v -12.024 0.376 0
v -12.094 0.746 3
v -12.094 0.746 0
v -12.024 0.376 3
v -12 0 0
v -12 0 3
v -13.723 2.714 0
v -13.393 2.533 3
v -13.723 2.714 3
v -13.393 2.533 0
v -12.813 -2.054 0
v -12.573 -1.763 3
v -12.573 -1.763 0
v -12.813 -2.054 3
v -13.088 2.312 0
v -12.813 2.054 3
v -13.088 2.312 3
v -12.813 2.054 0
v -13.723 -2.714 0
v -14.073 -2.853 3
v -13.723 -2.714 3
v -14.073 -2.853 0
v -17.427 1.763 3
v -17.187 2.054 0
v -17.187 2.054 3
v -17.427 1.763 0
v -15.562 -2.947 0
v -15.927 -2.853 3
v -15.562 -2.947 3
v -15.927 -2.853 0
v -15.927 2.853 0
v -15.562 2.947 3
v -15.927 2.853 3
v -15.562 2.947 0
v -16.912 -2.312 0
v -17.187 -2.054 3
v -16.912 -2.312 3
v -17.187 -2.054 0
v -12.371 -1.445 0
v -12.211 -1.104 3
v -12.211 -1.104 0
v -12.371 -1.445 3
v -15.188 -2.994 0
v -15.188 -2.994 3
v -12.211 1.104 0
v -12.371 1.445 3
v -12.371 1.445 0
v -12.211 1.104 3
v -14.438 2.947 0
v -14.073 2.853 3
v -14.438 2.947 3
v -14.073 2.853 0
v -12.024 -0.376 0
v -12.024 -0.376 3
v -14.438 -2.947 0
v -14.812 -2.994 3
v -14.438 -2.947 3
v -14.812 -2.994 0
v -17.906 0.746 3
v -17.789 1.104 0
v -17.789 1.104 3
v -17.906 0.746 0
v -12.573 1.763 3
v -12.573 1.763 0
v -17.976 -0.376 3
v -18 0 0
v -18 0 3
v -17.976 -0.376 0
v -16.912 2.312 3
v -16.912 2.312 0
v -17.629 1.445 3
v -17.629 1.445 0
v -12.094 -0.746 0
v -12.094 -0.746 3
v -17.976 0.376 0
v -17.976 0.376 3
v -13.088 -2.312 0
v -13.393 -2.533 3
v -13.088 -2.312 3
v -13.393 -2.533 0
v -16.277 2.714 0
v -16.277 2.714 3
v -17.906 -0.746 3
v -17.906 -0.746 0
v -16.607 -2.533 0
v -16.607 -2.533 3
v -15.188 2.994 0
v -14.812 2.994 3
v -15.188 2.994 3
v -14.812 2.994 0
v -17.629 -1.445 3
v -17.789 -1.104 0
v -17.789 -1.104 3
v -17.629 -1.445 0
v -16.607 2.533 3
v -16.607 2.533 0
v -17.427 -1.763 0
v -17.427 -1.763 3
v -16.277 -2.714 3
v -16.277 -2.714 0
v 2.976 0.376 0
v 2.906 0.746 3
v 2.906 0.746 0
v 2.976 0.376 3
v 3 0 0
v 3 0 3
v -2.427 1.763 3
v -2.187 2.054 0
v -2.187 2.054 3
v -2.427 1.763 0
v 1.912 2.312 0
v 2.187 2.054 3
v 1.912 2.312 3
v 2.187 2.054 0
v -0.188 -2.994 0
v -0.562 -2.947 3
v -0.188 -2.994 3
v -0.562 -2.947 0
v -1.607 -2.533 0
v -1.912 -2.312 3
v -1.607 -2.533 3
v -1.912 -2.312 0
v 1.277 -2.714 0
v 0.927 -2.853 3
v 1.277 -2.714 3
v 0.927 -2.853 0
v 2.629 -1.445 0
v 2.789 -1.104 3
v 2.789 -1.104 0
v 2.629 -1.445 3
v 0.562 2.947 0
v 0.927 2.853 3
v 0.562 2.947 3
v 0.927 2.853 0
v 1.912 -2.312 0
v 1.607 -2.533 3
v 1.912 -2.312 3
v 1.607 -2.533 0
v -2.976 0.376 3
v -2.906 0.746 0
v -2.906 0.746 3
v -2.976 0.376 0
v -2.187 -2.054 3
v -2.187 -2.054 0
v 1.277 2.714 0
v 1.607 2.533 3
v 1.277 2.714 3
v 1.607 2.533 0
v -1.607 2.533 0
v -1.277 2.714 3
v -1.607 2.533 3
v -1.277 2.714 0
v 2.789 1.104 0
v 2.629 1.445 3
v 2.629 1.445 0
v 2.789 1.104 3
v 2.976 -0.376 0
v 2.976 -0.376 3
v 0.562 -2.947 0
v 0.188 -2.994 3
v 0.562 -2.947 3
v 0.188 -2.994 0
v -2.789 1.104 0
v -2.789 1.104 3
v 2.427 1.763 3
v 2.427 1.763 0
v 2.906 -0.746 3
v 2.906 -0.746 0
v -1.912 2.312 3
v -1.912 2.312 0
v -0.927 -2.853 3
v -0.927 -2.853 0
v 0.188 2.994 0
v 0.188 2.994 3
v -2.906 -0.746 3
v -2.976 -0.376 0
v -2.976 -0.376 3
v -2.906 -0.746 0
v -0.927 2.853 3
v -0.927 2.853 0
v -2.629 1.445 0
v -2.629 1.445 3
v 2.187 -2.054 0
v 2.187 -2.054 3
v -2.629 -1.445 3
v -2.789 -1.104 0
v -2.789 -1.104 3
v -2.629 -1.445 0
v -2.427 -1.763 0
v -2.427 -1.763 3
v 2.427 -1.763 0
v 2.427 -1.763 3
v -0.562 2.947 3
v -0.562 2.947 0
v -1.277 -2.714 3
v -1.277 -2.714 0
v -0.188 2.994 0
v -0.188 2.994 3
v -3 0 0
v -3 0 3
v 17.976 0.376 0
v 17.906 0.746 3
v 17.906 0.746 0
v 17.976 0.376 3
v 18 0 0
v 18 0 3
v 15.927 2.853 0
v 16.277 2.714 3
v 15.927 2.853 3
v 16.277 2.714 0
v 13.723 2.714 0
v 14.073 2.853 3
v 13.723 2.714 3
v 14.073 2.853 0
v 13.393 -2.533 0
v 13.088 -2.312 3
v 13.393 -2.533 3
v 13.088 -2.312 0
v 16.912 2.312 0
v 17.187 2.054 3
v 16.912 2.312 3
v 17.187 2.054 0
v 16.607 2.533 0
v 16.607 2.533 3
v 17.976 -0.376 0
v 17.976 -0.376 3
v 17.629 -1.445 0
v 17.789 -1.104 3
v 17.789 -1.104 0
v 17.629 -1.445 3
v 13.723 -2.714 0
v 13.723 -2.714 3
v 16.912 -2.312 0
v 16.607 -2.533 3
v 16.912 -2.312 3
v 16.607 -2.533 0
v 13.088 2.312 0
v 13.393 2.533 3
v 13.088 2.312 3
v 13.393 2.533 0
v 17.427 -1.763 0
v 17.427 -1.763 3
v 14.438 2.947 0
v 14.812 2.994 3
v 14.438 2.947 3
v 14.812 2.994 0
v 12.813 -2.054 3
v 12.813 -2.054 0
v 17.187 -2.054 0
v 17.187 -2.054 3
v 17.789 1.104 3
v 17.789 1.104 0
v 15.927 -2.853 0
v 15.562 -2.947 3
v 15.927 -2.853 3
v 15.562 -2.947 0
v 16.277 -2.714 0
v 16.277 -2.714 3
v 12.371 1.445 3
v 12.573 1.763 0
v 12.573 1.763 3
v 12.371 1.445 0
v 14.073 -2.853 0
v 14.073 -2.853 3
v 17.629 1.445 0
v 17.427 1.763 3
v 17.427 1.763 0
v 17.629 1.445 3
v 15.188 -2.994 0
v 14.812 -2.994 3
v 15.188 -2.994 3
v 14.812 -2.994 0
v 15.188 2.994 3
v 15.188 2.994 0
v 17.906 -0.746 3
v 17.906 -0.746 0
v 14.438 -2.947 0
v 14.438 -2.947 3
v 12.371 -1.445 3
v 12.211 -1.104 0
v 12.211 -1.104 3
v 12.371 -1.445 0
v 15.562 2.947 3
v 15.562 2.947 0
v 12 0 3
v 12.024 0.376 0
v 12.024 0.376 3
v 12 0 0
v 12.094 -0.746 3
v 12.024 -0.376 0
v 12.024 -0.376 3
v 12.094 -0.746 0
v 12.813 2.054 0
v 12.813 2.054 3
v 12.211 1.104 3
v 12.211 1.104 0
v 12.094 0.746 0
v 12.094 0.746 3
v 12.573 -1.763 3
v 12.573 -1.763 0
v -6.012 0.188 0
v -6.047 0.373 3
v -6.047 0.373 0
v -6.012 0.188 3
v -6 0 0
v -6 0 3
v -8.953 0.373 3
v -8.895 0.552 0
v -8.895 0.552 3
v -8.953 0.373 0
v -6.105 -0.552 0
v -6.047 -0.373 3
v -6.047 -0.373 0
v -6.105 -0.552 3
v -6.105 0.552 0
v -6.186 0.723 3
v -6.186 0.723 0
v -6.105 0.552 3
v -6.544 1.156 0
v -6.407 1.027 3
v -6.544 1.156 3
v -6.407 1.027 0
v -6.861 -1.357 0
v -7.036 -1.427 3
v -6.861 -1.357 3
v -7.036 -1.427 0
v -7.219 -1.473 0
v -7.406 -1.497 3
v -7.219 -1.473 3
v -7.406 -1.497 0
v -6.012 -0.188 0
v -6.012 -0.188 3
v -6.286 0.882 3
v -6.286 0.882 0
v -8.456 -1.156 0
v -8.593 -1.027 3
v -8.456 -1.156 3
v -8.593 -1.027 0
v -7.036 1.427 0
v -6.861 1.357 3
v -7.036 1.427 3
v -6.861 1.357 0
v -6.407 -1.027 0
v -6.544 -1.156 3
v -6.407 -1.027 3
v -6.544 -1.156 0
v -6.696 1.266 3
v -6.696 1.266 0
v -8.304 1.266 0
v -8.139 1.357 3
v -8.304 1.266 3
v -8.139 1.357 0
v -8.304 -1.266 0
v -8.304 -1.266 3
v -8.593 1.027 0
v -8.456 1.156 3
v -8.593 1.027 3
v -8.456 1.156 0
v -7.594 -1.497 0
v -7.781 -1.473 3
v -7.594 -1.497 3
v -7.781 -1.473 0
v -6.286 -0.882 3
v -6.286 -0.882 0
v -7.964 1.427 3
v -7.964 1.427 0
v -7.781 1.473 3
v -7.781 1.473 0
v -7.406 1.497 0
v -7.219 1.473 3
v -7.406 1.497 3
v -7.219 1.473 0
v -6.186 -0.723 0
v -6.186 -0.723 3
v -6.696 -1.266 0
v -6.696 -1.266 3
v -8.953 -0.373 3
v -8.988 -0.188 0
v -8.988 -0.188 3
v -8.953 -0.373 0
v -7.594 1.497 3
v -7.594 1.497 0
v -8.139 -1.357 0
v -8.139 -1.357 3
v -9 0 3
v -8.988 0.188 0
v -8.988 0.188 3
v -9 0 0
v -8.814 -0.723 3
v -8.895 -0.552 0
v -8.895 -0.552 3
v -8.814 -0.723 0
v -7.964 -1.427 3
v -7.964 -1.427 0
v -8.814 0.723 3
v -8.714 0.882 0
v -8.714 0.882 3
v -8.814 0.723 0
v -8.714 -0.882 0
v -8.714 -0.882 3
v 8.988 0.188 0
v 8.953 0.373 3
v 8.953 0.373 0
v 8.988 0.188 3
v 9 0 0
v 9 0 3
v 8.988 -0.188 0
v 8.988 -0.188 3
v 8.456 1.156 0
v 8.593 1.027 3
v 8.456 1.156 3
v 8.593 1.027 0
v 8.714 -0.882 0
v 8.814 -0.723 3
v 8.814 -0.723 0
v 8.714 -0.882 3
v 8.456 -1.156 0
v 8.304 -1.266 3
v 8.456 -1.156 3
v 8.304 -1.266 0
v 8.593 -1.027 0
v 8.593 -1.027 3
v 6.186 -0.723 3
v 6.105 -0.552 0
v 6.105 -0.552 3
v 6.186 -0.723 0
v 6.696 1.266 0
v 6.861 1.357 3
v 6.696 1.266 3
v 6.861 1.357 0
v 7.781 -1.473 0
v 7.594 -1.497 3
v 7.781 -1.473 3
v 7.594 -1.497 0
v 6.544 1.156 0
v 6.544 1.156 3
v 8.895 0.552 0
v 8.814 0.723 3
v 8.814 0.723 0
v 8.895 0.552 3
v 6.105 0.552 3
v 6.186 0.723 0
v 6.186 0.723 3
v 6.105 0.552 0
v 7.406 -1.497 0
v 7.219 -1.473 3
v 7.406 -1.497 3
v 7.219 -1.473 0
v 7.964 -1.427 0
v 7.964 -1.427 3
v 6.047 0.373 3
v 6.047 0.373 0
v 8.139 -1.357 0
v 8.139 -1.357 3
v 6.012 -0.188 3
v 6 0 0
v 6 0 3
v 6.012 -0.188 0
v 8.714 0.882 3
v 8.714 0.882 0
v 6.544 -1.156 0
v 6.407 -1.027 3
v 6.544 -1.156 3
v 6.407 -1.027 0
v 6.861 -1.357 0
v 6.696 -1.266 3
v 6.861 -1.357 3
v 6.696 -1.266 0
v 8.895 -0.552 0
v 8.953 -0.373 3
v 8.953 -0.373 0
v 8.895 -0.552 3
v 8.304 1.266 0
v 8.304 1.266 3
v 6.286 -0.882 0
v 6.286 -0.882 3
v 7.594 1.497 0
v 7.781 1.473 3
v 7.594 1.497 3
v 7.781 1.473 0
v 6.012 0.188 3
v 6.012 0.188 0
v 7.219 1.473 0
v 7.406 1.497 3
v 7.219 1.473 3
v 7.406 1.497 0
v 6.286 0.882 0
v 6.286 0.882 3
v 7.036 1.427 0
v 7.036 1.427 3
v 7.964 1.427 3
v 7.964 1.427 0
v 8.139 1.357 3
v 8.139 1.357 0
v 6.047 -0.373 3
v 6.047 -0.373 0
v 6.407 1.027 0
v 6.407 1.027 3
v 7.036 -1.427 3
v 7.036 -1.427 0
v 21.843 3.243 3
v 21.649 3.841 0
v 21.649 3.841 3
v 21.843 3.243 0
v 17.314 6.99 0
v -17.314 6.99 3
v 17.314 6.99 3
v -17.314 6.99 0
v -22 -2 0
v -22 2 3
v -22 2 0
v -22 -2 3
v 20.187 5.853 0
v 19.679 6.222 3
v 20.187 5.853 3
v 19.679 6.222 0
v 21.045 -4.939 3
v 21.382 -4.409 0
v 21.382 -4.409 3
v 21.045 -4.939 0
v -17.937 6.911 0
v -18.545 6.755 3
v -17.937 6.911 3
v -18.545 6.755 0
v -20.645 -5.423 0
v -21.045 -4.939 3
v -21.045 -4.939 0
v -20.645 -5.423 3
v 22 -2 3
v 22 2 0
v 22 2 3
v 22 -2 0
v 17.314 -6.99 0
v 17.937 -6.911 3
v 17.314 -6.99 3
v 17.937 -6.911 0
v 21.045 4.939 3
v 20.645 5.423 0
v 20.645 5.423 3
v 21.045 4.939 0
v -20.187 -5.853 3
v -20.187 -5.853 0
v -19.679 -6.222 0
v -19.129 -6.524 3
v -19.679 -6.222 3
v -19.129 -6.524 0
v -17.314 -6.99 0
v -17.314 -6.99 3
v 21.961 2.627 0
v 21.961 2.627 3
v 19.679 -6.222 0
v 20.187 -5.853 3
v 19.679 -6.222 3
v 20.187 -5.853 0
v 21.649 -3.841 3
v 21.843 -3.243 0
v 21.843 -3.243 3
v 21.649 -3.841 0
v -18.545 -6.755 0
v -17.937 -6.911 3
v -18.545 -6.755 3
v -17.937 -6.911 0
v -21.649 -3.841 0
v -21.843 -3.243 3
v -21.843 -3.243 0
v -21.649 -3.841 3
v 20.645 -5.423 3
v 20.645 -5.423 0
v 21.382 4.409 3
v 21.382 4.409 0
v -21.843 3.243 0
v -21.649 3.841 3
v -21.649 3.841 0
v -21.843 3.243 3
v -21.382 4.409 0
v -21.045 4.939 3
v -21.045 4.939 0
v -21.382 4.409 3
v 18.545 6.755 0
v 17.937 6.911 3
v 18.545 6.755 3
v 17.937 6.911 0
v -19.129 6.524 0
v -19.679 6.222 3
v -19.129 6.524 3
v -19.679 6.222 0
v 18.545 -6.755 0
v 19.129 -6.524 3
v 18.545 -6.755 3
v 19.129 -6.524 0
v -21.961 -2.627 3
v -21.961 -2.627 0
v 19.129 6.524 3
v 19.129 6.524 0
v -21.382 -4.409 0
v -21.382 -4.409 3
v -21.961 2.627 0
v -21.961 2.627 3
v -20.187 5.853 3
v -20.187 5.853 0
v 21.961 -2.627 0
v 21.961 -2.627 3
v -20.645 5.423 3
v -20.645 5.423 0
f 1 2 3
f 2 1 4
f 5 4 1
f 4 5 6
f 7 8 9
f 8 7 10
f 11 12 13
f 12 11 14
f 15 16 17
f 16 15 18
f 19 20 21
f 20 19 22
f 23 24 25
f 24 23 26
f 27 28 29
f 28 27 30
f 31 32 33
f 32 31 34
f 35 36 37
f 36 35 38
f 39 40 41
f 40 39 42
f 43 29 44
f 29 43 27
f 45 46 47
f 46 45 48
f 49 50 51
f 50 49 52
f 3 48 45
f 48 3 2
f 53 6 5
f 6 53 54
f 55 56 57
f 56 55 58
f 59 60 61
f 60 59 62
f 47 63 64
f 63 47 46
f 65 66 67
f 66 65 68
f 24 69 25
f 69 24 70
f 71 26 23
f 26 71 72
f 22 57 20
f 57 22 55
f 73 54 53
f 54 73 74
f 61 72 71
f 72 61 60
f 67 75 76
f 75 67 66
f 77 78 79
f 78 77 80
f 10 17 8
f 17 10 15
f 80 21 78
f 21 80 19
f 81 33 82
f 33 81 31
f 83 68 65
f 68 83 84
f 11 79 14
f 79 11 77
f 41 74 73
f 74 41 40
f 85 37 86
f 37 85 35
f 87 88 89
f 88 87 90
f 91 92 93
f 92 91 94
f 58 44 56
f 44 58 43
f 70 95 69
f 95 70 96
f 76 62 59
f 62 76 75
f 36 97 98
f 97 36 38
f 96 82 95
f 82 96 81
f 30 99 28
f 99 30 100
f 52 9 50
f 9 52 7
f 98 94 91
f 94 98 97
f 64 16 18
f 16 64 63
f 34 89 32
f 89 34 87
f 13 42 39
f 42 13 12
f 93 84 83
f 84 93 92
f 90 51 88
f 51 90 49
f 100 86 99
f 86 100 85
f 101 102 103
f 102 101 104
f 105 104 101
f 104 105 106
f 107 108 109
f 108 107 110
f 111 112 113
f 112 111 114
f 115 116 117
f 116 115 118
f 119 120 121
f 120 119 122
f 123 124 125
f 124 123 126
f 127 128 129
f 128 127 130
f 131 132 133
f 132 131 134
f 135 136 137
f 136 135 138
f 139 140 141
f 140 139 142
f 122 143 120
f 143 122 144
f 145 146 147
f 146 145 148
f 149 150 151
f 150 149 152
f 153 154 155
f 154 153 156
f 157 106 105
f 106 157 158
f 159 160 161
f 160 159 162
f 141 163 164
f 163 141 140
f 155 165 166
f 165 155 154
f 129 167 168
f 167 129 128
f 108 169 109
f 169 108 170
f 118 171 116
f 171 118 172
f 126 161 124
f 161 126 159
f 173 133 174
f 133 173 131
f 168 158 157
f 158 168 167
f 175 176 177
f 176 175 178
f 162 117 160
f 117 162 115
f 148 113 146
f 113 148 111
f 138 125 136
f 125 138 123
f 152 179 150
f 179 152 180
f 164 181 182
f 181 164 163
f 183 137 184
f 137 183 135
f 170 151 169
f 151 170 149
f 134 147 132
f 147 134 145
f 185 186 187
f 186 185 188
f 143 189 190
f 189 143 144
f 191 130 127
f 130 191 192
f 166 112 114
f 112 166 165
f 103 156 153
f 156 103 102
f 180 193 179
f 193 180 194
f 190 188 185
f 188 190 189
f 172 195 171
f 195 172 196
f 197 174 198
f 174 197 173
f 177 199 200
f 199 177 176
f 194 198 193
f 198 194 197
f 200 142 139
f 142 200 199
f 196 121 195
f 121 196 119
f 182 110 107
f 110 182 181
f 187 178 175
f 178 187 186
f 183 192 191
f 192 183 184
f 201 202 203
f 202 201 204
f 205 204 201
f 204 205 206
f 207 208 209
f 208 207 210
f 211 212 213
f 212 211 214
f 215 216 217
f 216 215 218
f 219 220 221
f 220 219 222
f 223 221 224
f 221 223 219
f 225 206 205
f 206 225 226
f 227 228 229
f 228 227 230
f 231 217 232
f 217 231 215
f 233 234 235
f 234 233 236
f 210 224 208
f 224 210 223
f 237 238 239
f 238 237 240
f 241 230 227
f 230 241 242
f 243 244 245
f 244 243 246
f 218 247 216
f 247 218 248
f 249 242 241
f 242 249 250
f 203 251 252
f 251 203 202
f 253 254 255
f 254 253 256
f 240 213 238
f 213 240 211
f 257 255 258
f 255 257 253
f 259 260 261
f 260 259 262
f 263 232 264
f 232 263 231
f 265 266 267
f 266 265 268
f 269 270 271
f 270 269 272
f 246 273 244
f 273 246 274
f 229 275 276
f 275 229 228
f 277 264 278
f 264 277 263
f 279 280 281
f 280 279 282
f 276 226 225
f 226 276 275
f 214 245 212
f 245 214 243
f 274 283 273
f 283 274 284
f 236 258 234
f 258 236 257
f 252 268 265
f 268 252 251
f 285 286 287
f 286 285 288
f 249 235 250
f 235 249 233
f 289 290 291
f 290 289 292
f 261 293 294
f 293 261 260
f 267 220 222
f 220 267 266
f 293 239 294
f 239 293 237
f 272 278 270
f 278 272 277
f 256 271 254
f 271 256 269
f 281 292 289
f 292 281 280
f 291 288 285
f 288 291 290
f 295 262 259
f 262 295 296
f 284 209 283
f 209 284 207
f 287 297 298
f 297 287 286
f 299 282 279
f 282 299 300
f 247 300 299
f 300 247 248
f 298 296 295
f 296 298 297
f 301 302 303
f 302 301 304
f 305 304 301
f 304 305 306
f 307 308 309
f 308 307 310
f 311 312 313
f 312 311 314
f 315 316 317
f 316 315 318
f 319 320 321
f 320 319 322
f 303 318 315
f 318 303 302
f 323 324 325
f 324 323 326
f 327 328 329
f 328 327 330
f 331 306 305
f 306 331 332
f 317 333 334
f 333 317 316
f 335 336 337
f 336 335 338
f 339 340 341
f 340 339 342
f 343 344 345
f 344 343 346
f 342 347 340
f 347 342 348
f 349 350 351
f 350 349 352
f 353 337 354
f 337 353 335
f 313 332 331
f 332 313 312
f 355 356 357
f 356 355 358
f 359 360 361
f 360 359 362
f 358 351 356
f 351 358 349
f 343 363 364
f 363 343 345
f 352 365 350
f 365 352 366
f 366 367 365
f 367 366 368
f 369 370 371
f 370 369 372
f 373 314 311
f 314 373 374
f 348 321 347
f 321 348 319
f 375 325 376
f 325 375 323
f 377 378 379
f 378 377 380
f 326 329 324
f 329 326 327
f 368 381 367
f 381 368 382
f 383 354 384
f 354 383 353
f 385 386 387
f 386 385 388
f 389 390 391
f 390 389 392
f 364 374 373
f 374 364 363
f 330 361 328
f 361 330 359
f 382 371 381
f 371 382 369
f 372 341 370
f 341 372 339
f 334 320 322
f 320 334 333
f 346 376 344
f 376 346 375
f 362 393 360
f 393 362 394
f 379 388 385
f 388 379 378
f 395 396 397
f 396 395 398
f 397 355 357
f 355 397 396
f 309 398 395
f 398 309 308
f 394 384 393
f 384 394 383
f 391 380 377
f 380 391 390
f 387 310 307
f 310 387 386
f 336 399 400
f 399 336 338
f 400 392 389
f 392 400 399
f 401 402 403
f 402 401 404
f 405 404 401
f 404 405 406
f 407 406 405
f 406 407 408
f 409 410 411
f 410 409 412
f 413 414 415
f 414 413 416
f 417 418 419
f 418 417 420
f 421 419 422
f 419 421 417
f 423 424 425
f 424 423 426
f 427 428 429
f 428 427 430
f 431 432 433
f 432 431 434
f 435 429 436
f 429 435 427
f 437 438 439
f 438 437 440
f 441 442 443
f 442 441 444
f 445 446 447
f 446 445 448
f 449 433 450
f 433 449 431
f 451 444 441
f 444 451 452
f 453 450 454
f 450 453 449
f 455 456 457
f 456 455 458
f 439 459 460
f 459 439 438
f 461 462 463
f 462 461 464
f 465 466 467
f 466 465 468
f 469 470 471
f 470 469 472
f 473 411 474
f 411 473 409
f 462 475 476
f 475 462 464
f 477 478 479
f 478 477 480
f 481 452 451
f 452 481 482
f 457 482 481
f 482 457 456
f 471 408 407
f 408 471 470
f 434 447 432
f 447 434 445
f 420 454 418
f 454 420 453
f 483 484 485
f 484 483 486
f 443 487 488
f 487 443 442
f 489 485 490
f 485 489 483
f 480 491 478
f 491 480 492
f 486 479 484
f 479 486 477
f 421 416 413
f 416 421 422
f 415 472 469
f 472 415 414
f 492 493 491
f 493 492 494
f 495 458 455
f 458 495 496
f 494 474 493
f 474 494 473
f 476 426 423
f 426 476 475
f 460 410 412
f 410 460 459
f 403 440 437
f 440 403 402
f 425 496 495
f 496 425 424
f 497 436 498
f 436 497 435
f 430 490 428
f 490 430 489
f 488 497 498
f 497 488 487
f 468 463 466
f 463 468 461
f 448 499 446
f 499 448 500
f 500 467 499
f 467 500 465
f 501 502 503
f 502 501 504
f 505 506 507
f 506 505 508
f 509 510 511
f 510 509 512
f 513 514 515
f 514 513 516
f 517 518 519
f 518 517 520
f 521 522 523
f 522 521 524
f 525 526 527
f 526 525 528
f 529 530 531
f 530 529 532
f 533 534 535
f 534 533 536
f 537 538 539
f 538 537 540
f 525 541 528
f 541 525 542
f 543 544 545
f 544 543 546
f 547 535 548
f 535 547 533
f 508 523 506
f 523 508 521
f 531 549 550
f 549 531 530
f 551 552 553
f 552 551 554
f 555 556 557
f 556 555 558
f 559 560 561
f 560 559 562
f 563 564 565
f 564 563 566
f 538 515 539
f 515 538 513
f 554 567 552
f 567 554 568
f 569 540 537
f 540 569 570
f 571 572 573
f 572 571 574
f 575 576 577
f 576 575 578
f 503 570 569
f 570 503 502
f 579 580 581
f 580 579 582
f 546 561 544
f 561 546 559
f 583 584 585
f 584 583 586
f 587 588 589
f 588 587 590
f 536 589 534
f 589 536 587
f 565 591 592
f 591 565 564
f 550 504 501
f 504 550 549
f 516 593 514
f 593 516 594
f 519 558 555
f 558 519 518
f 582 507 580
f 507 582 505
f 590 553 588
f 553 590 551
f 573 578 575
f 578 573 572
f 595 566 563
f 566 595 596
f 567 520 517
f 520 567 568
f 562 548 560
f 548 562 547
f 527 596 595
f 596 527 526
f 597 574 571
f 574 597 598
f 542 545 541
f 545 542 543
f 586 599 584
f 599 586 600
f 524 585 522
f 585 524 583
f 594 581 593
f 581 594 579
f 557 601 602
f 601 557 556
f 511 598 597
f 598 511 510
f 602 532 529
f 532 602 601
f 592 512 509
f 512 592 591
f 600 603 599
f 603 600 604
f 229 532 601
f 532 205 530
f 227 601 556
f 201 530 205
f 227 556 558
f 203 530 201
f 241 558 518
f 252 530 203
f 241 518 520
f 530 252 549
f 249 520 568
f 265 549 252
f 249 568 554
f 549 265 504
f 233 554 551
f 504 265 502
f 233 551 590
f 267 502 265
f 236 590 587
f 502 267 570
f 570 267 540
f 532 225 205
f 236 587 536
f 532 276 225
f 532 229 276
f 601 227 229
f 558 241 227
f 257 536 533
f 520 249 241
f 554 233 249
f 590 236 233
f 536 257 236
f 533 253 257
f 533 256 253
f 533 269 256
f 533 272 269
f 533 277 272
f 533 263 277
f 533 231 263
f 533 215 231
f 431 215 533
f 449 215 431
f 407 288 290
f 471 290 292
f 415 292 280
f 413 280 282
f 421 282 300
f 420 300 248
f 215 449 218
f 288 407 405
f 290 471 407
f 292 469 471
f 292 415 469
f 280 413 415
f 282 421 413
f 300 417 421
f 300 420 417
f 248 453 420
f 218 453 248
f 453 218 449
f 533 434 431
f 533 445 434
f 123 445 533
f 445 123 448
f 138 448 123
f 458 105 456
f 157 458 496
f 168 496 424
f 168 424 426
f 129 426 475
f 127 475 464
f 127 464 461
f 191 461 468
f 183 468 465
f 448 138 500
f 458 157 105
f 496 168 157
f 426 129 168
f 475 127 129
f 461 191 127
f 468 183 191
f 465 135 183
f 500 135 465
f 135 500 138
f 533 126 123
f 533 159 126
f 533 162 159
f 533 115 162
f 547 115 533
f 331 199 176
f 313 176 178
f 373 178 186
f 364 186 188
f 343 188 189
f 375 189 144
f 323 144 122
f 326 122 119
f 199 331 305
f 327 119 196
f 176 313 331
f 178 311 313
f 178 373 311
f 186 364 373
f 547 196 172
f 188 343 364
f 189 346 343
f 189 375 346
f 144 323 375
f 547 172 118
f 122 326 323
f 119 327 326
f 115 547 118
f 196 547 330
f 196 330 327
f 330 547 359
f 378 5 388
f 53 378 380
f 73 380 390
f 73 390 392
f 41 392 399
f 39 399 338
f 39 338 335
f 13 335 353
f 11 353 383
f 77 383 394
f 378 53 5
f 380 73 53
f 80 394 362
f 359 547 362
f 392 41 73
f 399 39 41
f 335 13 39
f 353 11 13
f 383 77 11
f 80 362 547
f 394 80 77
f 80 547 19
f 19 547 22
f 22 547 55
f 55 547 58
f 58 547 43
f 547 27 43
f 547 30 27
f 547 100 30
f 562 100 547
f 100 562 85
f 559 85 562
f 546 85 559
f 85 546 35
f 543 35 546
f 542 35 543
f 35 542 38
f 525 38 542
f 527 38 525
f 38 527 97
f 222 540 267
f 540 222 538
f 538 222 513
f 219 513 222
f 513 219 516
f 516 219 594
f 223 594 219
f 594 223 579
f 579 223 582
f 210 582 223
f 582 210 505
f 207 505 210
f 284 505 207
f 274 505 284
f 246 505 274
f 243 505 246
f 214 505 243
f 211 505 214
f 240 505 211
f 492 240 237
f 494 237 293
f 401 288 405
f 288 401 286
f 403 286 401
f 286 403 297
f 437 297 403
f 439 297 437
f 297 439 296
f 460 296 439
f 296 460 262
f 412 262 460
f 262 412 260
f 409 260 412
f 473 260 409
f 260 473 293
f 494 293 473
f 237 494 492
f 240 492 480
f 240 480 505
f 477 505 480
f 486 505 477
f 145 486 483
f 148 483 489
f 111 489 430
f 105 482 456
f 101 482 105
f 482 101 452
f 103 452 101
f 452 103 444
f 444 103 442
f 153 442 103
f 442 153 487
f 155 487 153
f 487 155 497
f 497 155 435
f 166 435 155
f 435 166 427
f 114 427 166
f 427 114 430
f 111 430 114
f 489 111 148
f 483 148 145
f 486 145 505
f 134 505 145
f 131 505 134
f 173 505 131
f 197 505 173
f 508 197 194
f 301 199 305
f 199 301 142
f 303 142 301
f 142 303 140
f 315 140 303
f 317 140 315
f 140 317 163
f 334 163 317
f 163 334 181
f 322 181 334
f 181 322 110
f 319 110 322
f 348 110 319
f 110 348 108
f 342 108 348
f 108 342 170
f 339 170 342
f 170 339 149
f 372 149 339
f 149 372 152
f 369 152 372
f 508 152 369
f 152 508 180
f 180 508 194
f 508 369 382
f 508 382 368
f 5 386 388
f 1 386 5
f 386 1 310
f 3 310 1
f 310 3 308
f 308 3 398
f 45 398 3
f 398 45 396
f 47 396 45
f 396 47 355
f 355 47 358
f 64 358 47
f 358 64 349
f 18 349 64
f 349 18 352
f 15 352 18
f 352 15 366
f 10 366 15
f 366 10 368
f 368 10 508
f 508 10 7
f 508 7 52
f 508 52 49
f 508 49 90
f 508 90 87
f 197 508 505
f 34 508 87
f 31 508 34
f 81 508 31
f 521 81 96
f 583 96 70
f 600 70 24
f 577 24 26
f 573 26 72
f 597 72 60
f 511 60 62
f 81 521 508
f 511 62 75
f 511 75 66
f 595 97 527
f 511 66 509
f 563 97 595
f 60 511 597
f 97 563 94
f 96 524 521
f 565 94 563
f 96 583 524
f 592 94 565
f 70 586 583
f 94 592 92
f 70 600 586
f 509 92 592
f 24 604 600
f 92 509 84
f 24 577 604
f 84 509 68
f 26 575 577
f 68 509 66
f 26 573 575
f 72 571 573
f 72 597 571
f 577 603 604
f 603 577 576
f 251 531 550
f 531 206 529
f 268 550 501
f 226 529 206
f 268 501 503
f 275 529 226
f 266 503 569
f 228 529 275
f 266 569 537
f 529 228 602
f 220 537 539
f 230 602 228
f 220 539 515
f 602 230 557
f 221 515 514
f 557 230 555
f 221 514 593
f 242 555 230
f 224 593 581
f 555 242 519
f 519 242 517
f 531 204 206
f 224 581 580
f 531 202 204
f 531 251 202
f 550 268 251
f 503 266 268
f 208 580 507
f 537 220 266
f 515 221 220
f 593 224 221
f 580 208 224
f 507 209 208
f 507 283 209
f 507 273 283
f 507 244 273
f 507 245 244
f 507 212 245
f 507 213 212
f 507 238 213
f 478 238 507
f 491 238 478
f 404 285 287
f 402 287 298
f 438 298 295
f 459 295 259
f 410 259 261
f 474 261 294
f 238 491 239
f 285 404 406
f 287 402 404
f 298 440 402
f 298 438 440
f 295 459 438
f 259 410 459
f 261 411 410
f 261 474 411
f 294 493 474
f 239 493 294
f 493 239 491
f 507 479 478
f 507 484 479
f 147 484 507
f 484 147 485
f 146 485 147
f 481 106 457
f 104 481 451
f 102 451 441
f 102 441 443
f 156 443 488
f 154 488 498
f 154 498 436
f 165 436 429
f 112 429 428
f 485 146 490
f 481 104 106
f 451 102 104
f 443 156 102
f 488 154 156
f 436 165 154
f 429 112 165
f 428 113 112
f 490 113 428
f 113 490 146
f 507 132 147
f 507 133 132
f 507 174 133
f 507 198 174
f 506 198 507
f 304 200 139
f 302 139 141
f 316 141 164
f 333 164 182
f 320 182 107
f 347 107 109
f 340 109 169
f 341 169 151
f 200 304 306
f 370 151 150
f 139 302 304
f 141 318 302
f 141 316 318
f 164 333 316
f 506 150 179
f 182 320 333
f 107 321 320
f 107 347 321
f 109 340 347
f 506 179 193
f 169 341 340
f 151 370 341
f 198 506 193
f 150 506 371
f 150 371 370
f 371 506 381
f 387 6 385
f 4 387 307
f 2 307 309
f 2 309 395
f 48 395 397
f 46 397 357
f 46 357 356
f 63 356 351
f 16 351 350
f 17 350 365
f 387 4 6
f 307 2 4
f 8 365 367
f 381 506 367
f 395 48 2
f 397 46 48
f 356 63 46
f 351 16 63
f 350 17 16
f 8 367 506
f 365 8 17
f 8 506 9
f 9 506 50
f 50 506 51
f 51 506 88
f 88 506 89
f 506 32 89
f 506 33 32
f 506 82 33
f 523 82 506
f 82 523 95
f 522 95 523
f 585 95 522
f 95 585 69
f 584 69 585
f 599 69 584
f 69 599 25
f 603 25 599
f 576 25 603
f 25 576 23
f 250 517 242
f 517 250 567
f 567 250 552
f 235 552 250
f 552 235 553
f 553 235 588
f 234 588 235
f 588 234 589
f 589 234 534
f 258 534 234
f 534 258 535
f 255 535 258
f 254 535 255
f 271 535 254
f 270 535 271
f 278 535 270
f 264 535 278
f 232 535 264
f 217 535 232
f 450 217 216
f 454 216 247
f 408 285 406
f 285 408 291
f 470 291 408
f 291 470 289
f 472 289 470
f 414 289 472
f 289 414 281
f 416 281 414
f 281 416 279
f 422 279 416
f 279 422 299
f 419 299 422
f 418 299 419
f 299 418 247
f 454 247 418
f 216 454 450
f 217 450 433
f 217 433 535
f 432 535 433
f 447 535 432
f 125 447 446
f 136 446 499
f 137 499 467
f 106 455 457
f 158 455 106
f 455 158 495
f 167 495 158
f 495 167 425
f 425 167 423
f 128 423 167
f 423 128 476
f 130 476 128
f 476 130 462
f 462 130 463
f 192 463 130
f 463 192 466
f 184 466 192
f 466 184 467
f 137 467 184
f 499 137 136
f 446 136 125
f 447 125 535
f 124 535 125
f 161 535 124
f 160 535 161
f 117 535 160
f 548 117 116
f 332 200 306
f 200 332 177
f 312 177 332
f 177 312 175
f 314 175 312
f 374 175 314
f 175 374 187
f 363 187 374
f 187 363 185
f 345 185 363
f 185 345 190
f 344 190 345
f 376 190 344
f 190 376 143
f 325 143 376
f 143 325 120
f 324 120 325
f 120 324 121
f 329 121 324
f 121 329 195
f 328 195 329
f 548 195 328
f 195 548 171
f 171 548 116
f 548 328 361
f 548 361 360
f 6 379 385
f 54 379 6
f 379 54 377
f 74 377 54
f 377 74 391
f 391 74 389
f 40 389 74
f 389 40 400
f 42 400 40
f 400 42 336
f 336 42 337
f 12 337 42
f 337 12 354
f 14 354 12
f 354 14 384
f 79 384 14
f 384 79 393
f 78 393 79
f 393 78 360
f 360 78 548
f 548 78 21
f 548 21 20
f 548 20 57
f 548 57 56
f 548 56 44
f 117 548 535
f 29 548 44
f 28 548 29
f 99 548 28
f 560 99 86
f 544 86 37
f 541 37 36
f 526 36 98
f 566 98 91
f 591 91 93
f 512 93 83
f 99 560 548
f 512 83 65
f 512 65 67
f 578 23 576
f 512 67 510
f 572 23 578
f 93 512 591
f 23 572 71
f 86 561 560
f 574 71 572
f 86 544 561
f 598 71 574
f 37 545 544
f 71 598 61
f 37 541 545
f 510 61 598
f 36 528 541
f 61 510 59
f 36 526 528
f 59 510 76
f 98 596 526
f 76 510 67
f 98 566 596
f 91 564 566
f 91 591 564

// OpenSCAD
$fn = 50;


difference() {
	union() {
		*color(alpha = 1.0000000000, c = "gray") {
			translate(v = [0, 7, 0]) {
				linear_extrude(height = 1) {
					text(font = "Arial:style=Bold", halign = "center", size = 4.5000000000, text = "COMMENT plate main", valign = "center");
				}
			}
		}
		hull() {
			translate(v = [-17.0000000000, 2.0000000000, 0]) {
				cylinder(h = 3, r = 5);
			}
			translate(v = [17.0000000000, 2.0000000000, 0]) {
				cylinder(h = 3, r = 5);
			}
			translate(v = [-17.0000000000, -2.0000000000, 0]) {
				cylinder(h = 3, r = 5);
			}
			translate(v = [17.0000000000, -2.0000000000, 0]) {
				cylinder(h = 3, r = 5);
			}
		}
	}
	union() {
		*color(alpha = 1.0000000000, c = "gray") {
			translate(v = [0, 7, 0]) {
				linear_extrude(height = 1) {
					text(font = "Arial:style=Bold", halign = "center", size = 4.5000000000, text = "COMMENT holes main", valign = "center");
				}
			}
		}
		translate(v = [-15.0000000000, 0.0000000000, 0]) {
			translate(v = [0, 0, -100]) {
				cylinder(h = 200, r = 3.0000000000);
			}
		}
		translate(v = [0, 0, -100]) {
			cylinder(h = 200, r = 3.0000000000);
		}
		translate(v = [15.0000000000, 0.0000000000, 0]) {
			translate(v = [0, 0, -100]) {
				cylinder(h = 200, r = 3.0000000000);
			}
		}
		translate(v = [-15.0000000000, 0.0000000000, 0]) {
			translate(v = [0, 0, -100]) {
				cylinder(h = 200, r = 1.5000000000);
			}
		}
		translate(v = [-7.5000000000, 0.0000000000, 0]) {
			translate(v = [0, 0, -100]) {
				cylinder(h = 200, r = 1.5000000000);
			}
		}
		translate(v = [0, 0, -100]) {
			cylinder(h = 200, r = 1.5000000000);
		}
		translate(v = [7.5000000000, 0.0000000000, 0]) {
			translate(v = [0, 0, -100]) {
				cylinder(h = 200, r = 1.5000000000);
			}
		}
		translate(v = [15.0000000000, 0.0000000000, 0]) {
			translate(v = [0, 0, -100]) {
				cylinder(h = 200, r = 1.5000000000);
			}
		}
	}
}
